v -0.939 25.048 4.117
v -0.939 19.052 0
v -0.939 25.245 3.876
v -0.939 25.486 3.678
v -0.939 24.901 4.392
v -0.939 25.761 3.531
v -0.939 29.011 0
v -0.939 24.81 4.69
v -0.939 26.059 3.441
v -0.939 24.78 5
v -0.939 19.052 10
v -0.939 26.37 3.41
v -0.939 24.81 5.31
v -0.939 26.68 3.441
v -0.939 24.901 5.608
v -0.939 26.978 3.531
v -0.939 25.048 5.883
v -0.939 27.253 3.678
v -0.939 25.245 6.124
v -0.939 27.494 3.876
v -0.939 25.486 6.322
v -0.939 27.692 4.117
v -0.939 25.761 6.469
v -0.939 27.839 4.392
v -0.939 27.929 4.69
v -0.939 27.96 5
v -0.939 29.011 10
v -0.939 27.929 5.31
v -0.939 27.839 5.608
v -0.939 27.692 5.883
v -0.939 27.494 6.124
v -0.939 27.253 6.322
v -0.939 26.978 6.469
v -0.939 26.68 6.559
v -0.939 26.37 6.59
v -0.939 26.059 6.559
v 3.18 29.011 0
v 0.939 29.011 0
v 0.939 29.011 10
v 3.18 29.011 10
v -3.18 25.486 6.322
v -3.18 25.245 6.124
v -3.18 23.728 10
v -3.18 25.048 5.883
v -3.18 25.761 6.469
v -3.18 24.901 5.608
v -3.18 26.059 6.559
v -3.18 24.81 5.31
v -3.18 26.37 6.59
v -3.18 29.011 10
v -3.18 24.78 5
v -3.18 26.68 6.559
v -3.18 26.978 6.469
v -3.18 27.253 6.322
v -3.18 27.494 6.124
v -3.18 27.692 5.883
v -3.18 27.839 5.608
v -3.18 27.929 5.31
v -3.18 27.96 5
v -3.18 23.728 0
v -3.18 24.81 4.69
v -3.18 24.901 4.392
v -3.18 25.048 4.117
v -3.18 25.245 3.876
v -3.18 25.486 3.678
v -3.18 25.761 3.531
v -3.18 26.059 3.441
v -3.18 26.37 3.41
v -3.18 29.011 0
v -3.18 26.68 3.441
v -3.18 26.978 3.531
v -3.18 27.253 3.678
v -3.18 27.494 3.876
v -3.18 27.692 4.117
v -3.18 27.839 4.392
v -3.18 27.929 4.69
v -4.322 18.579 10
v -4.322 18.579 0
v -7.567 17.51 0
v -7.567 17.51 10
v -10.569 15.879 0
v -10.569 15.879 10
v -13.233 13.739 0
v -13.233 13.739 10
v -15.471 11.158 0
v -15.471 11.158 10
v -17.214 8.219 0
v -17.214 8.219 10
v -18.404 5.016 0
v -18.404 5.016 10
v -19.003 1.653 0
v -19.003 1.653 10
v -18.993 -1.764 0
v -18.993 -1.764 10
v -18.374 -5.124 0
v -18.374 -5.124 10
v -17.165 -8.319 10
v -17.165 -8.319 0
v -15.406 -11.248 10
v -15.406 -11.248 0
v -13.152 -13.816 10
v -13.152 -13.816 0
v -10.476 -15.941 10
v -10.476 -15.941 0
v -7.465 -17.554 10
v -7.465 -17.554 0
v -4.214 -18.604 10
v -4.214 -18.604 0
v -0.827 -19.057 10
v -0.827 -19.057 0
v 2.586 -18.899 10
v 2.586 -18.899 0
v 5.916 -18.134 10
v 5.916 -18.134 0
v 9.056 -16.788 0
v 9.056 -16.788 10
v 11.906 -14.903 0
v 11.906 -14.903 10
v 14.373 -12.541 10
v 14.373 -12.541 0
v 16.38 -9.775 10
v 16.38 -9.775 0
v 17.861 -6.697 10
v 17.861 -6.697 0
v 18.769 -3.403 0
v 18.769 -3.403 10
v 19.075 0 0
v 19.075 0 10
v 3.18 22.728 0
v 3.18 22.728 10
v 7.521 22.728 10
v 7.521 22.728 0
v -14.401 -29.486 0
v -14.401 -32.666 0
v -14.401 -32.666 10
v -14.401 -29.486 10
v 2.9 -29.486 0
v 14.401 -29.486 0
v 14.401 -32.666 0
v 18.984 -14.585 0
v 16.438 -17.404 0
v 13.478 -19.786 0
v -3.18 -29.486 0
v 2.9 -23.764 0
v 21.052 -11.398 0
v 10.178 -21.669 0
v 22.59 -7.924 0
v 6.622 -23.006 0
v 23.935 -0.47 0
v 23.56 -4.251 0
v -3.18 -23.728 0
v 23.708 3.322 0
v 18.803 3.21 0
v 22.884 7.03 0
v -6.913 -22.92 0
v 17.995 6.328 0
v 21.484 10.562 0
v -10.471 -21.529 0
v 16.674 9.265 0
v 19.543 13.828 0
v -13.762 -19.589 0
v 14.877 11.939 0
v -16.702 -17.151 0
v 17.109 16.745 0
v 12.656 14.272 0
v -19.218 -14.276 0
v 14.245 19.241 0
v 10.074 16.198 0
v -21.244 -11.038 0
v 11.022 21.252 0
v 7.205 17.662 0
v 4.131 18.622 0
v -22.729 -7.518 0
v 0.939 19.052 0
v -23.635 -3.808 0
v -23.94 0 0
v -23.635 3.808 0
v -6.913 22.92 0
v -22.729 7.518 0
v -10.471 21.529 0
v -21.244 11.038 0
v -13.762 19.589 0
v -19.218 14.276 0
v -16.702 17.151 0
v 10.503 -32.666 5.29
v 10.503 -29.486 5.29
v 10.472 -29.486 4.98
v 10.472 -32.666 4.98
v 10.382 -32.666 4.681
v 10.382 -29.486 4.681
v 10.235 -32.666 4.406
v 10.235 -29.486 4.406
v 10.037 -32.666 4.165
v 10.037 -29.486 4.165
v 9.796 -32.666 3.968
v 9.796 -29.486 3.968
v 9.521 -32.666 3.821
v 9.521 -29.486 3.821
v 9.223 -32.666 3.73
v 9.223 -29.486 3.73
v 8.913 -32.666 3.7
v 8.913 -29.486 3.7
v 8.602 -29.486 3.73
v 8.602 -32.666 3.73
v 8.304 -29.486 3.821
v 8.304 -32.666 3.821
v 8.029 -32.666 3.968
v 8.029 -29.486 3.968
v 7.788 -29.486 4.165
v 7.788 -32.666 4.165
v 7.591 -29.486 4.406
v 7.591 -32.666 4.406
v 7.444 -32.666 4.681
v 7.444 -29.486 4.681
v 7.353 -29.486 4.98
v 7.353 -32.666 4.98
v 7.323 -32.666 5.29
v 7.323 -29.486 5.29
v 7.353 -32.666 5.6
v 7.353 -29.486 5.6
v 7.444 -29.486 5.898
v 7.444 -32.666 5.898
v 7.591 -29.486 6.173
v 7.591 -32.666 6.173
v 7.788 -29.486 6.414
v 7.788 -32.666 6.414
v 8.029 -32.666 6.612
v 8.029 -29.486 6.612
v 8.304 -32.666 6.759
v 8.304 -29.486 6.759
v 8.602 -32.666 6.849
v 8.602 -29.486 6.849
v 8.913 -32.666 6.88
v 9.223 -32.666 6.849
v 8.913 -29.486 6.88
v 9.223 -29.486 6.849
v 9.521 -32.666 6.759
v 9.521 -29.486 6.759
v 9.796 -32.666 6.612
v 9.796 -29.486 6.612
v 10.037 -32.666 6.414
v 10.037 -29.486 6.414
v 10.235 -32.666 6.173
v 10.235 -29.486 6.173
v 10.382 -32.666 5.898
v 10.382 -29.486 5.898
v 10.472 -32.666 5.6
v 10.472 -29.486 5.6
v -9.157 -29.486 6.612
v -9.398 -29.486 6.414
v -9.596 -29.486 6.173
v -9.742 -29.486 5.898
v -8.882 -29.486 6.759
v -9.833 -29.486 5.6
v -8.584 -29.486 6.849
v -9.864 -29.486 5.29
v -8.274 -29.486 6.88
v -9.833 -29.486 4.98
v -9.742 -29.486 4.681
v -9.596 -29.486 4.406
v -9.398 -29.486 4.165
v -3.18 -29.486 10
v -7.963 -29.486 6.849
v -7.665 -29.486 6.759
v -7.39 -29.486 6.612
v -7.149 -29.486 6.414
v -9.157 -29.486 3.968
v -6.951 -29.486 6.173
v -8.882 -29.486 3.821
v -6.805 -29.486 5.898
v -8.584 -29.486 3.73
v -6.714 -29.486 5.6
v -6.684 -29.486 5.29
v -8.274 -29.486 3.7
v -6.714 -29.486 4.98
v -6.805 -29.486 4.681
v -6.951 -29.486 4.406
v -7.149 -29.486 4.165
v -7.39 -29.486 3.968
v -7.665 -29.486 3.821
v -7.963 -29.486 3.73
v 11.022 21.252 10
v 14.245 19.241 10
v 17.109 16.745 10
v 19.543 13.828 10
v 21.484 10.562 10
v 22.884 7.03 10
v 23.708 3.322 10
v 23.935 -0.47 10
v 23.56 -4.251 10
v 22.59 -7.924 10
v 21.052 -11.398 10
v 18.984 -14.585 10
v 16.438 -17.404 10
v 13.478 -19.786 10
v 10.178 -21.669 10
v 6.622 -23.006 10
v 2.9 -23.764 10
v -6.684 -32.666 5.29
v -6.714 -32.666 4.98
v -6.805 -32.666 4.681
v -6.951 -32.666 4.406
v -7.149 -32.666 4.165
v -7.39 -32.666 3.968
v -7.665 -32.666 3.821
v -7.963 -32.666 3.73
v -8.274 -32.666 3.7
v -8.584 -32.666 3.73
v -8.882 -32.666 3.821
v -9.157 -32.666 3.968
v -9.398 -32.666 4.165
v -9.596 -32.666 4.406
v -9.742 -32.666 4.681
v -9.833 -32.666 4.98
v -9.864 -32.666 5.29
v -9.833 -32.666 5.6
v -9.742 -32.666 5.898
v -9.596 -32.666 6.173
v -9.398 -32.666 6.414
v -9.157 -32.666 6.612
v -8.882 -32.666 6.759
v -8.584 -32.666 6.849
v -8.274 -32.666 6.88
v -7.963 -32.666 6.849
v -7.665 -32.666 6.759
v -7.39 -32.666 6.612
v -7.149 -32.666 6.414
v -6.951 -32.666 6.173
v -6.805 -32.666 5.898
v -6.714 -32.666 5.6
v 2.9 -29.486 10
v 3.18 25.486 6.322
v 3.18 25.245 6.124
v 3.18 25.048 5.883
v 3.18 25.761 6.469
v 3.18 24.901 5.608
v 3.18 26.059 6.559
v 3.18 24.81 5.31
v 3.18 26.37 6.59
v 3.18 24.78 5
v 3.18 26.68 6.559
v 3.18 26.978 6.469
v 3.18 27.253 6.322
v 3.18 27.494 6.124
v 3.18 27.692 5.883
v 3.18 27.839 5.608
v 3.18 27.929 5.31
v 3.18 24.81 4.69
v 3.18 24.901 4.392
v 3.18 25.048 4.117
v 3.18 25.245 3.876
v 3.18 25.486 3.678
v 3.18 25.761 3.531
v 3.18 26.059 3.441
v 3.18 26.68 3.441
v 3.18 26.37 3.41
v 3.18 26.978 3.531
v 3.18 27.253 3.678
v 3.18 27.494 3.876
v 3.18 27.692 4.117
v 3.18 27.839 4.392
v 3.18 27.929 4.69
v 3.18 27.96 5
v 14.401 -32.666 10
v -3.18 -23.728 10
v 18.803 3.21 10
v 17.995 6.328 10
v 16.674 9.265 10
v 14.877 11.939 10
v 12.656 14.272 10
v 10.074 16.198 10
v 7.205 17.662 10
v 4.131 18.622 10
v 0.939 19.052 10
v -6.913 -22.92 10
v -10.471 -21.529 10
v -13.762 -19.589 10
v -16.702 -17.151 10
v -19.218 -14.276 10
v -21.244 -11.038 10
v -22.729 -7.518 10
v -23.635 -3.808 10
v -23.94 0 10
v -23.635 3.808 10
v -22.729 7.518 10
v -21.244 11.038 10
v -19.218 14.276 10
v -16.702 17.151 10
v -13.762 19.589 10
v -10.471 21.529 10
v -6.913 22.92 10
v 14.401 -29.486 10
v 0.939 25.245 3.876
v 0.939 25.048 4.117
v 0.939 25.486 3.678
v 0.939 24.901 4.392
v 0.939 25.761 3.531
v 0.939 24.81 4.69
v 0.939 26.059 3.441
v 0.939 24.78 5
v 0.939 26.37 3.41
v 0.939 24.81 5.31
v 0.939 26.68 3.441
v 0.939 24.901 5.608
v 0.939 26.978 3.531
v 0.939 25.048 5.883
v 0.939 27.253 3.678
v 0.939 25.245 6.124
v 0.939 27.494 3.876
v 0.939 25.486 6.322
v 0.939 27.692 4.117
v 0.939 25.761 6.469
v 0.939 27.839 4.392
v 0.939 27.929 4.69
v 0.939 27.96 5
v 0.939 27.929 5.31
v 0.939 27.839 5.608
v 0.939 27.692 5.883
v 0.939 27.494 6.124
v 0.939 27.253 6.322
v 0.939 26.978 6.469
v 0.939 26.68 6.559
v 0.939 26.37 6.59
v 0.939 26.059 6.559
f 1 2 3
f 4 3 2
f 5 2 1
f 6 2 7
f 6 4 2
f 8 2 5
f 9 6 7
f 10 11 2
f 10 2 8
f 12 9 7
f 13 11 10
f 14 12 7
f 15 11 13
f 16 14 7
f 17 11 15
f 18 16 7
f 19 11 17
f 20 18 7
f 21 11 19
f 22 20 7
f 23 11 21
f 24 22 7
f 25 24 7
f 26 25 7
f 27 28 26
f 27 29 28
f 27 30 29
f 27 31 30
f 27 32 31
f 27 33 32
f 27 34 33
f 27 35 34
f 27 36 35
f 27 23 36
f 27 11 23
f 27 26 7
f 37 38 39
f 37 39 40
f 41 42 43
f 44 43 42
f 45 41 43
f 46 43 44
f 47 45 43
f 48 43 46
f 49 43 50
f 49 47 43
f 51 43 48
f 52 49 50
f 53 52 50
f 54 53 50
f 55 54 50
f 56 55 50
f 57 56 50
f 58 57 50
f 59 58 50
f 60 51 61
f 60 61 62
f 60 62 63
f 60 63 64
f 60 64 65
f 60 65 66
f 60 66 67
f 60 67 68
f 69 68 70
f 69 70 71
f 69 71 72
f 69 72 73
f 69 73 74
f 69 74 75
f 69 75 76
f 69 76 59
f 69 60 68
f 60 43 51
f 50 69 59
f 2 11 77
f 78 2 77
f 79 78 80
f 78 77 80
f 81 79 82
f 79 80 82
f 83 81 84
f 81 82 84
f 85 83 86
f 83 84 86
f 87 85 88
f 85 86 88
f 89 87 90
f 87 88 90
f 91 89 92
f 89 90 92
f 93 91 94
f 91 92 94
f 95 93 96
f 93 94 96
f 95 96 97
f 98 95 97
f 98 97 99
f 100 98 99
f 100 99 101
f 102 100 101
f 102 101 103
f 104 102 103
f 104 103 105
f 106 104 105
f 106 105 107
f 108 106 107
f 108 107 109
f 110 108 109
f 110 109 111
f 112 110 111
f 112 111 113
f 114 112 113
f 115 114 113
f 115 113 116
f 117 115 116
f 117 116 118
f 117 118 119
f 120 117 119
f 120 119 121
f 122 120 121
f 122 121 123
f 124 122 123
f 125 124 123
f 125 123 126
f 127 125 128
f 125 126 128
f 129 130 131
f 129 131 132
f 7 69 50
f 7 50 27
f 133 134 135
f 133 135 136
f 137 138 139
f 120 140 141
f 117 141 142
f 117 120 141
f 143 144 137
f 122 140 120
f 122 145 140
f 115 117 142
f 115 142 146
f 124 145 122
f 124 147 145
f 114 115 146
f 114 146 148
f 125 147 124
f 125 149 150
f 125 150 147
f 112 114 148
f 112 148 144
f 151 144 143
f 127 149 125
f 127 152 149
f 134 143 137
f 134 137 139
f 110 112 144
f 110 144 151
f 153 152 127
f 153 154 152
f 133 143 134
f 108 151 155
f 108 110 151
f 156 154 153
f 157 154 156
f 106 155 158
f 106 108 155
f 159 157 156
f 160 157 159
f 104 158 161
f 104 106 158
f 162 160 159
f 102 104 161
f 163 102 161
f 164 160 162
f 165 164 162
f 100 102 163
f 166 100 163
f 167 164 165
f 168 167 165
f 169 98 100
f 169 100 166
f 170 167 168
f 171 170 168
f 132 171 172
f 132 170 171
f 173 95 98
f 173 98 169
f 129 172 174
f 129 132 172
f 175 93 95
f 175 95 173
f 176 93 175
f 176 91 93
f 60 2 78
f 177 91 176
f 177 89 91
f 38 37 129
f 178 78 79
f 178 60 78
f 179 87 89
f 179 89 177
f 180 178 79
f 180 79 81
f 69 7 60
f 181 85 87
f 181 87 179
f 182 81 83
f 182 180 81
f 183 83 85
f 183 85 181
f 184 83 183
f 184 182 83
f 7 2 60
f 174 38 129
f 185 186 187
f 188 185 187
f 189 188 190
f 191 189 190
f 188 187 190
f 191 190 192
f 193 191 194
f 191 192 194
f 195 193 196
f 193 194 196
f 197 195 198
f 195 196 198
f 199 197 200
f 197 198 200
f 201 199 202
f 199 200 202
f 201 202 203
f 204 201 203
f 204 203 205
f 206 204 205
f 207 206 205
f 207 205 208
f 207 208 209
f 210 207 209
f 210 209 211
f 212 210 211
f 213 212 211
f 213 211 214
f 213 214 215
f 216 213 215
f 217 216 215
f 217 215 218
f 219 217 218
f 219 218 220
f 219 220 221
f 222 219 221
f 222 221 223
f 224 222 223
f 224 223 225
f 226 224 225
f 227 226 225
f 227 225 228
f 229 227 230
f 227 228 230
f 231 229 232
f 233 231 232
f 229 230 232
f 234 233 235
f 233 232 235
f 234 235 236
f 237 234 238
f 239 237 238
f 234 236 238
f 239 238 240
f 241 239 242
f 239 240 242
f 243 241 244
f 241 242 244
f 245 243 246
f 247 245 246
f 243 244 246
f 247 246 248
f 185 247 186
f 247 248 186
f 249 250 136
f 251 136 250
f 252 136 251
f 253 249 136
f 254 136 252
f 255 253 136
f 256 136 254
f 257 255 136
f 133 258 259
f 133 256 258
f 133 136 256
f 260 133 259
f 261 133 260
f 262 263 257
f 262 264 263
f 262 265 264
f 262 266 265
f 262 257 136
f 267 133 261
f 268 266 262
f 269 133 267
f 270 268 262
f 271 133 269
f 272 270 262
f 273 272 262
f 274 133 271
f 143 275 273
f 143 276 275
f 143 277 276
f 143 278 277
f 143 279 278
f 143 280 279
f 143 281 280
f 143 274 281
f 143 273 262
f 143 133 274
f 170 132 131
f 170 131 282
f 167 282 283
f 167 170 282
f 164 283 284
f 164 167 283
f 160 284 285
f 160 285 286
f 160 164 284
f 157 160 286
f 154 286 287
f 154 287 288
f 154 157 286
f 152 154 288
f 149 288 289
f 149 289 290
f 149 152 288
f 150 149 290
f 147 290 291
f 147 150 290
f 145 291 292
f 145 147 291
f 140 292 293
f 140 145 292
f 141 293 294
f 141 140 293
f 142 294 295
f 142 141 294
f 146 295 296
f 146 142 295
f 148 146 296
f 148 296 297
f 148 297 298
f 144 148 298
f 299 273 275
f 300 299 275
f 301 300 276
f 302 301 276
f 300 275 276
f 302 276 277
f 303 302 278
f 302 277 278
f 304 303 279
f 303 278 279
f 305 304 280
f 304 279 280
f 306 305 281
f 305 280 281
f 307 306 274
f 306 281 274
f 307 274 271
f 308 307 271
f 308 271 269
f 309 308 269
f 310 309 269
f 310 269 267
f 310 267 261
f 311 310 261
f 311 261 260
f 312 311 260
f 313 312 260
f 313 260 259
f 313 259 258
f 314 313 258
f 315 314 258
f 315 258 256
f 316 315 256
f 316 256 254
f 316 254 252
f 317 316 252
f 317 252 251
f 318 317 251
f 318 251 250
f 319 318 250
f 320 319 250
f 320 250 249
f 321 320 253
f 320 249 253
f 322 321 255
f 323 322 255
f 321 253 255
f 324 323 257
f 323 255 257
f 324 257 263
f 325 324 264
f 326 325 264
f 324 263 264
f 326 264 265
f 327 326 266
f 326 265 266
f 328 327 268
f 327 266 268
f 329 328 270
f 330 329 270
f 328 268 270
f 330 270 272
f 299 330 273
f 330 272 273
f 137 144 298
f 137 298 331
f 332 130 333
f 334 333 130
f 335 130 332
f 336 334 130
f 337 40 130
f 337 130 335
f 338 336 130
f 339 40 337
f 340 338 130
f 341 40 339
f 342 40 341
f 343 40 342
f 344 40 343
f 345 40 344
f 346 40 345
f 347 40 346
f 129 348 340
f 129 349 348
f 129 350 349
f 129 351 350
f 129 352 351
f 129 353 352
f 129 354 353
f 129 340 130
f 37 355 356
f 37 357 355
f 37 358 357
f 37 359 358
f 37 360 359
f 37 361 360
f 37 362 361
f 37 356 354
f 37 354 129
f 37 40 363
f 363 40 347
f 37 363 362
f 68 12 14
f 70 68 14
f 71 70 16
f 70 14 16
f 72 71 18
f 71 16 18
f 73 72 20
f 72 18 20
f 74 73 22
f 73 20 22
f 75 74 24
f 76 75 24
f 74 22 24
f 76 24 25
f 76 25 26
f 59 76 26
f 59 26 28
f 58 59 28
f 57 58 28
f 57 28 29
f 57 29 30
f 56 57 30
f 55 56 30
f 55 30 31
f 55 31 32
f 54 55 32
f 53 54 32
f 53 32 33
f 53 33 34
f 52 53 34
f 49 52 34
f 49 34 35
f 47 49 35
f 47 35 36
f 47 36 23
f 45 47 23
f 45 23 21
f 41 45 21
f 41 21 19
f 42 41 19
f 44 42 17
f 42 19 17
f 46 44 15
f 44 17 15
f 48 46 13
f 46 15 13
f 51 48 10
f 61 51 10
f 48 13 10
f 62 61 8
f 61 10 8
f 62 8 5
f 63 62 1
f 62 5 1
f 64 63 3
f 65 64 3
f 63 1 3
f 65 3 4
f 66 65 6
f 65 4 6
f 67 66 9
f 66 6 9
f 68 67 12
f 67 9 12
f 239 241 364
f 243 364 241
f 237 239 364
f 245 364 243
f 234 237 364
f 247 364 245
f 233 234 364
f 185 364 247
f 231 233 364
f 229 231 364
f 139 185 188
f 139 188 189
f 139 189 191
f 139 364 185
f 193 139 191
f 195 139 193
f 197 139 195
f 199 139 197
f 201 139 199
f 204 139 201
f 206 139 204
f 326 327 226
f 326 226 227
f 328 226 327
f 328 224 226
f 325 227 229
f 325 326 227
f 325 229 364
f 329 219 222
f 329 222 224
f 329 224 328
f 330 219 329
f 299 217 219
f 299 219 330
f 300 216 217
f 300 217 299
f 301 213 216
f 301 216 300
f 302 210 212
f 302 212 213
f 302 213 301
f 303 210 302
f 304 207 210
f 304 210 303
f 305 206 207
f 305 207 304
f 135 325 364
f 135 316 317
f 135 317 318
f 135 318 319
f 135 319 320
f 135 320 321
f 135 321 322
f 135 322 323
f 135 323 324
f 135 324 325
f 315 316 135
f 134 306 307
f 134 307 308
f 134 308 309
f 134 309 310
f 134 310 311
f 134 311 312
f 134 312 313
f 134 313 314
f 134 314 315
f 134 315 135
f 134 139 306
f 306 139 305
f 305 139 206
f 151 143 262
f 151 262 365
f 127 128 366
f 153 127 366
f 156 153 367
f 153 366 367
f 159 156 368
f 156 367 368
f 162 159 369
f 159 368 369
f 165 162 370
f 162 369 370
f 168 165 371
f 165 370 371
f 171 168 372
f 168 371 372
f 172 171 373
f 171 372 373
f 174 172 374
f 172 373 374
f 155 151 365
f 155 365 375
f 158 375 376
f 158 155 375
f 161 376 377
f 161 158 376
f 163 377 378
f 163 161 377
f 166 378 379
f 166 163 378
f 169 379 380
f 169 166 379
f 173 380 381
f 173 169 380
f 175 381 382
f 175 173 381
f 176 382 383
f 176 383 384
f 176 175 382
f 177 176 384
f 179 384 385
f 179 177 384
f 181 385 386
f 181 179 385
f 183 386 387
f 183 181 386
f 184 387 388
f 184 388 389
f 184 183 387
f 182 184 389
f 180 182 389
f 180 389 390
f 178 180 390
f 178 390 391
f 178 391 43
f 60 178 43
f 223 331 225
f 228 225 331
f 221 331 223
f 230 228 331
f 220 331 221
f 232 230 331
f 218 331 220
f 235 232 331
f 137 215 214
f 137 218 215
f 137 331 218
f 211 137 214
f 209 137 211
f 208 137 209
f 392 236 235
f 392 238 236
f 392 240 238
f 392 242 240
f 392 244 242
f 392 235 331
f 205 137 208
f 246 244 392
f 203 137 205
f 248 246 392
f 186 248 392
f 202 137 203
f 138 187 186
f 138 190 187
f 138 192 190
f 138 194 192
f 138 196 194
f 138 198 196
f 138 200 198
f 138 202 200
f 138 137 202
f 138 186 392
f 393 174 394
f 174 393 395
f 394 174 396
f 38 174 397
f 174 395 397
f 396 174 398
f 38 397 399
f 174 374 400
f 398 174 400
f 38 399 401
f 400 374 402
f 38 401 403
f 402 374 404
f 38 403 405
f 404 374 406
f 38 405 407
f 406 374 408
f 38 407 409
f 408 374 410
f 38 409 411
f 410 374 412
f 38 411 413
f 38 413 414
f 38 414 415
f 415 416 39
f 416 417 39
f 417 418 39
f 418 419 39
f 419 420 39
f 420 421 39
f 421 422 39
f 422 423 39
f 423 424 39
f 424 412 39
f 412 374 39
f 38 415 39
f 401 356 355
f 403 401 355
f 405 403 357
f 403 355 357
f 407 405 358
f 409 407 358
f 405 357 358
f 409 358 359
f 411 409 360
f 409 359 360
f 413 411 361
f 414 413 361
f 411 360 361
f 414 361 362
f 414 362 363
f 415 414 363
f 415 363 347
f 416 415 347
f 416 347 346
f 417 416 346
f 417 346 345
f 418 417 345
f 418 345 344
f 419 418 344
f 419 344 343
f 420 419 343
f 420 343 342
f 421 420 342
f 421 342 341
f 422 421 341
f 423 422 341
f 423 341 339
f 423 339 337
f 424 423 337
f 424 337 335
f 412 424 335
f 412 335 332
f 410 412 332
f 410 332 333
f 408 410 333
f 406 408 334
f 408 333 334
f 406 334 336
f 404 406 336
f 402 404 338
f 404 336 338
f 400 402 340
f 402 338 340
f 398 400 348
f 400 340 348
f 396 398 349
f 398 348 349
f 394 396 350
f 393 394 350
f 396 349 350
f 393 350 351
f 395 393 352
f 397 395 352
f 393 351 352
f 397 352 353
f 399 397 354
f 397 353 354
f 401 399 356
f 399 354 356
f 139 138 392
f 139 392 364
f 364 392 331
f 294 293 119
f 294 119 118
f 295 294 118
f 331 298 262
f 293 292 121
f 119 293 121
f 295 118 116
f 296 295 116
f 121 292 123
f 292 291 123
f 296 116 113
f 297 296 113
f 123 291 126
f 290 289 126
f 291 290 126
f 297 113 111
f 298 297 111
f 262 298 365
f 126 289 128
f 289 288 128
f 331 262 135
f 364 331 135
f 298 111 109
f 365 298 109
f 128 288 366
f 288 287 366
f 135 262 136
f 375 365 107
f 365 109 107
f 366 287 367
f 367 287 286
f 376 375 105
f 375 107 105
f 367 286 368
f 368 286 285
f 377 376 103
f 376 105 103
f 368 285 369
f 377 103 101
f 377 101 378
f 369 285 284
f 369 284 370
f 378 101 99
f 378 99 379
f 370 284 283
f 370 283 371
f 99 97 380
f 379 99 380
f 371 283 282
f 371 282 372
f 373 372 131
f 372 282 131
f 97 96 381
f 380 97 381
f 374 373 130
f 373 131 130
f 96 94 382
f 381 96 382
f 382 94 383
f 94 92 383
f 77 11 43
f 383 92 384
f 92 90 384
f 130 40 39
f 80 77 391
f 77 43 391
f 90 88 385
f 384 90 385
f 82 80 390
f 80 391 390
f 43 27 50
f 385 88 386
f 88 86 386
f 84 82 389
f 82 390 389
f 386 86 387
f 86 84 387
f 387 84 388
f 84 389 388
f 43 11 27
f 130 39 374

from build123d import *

# Parameters (mm, degrees)
BOSS_EXTRUDE1_DEPTH = 10
SKETCH3_R           = 19.075
CUT_EXTRUDE1_DEPTH  = 11
SKETCH4_W           = 1.877089928
SKETCH4_H           = 9.959436021
CUT_EXTRUDE2_DEPTH  = 11
SKETCH5_R           = 1.59
CUT_EXTRUDE3_DEPTH  = 10
SKETCH6_R           = 1.59
CUT_EXTRUDE4_DEPTH  = 10
SKETCH7_W           = 10
SKETCH7_H           = 1
CUT_EXTRUDE5_DEPTH  = 29.718


with BuildPart() as part:
    # Sketch2 → Boss-Extrude1 (new body)
    with BuildSketch(Plane.XY):
        with BuildLine():
            Line((14.400910076, -32.666118303), (-14.400910076, -32.666118303))
            Line((-14.400910076, -32.666118303), (-14.400910076, -29.486118303))
            Line((-14.400910076, -29.486118303), (-3.18, -29.486118303))
            Line((-3.18, -29.486118303), (-3.18, -23.727857046))
            ThreePointArc((-3.18, -23.727857046), (-23.94, 0), (-3.18, 23.727857046))
            Line((-3.18, 23.727857046), (-3.18, 29.011332471))
            Line((-3.18, 29.011332471), (3.18, 29.011332471))
            Line((3.18, 29.011332471), (3.18, 23.727857046))
            ThreePointArc((3.18, 23.727857046), (23.939582665, -0.141357095), (2.89957421, -23.763755372))
            Line((2.89957421, -23.763755372), (2.89957421, -29.486118303))
            Line((2.89957421, -29.486118303), (14.400910076, -29.486118303))
            Line((14.400910076, -29.486118303), (14.400910076, -32.666118303))
        make_face()
    extrude(amount=BOSS_EXTRUDE1_DEPTH)

    # Sketch3 → Cut-Extrude1 (cut, through all)
    with BuildSketch(Plane.XY.offset(10)):
        Circle(SKETCH3_R)
    extrude(amount=-CUT_EXTRUDE1_DEPTH, mode=Mode.SUBTRACT)

    # Sketch4 → Cut-Extrude2 (cut, through all)
    with BuildSketch(Plane.XY.offset(10)):
        with Locations((0, 24.031614461)):
            Rectangle(SKETCH4_W, SKETCH4_H)
    extrude(amount=-CUT_EXTRUDE2_DEPTH, mode=Mode.SUBTRACT)

    # Sketch5 → Cut-Extrude3 (cut)
    with BuildSketch(Plane(origin=(3.18, 0, 0), x_dir=(0, 0, -1), z_dir=(1, 0, 0))):
        with Locations((-5, 26.369594759)):
            Circle(SKETCH5_R)
    extrude(amount=-CUT_EXTRUDE3_DEPTH, mode=Mode.SUBTRACT)

    # Sketch6 → Cut-Extrude4 (cut)
    with BuildSketch(Plane(origin=(0, -29.486118303, 0), x_dir=(1, 0, 0), z_dir=(0, 1, 0))):
        with Locations((8.912608952, -5.289784221)):
            Circle(SKETCH6_R)
        with Locations((-8.273500585, -5.289784221)):
            Circle(SKETCH6_R)
    extrude(amount=-CUT_EXTRUDE4_DEPTH, mode=Mode.SUBTRACT)

    # Sketch7 → Cut-Extrude5 (cut)
    with BuildSketch(Plane(origin=(3.18, 0, 0), x_dir=(0, 0, -1), z_dir=(1, 0, 0))):
        with Locations((-5, 23.227857046)):
            Rectangle(SKETCH7_W, SKETCH7_H)
    extrude(amount=CUT_EXTRUDE5_DEPTH, mode=Mode.SUBTRACT)


solid = part.part
